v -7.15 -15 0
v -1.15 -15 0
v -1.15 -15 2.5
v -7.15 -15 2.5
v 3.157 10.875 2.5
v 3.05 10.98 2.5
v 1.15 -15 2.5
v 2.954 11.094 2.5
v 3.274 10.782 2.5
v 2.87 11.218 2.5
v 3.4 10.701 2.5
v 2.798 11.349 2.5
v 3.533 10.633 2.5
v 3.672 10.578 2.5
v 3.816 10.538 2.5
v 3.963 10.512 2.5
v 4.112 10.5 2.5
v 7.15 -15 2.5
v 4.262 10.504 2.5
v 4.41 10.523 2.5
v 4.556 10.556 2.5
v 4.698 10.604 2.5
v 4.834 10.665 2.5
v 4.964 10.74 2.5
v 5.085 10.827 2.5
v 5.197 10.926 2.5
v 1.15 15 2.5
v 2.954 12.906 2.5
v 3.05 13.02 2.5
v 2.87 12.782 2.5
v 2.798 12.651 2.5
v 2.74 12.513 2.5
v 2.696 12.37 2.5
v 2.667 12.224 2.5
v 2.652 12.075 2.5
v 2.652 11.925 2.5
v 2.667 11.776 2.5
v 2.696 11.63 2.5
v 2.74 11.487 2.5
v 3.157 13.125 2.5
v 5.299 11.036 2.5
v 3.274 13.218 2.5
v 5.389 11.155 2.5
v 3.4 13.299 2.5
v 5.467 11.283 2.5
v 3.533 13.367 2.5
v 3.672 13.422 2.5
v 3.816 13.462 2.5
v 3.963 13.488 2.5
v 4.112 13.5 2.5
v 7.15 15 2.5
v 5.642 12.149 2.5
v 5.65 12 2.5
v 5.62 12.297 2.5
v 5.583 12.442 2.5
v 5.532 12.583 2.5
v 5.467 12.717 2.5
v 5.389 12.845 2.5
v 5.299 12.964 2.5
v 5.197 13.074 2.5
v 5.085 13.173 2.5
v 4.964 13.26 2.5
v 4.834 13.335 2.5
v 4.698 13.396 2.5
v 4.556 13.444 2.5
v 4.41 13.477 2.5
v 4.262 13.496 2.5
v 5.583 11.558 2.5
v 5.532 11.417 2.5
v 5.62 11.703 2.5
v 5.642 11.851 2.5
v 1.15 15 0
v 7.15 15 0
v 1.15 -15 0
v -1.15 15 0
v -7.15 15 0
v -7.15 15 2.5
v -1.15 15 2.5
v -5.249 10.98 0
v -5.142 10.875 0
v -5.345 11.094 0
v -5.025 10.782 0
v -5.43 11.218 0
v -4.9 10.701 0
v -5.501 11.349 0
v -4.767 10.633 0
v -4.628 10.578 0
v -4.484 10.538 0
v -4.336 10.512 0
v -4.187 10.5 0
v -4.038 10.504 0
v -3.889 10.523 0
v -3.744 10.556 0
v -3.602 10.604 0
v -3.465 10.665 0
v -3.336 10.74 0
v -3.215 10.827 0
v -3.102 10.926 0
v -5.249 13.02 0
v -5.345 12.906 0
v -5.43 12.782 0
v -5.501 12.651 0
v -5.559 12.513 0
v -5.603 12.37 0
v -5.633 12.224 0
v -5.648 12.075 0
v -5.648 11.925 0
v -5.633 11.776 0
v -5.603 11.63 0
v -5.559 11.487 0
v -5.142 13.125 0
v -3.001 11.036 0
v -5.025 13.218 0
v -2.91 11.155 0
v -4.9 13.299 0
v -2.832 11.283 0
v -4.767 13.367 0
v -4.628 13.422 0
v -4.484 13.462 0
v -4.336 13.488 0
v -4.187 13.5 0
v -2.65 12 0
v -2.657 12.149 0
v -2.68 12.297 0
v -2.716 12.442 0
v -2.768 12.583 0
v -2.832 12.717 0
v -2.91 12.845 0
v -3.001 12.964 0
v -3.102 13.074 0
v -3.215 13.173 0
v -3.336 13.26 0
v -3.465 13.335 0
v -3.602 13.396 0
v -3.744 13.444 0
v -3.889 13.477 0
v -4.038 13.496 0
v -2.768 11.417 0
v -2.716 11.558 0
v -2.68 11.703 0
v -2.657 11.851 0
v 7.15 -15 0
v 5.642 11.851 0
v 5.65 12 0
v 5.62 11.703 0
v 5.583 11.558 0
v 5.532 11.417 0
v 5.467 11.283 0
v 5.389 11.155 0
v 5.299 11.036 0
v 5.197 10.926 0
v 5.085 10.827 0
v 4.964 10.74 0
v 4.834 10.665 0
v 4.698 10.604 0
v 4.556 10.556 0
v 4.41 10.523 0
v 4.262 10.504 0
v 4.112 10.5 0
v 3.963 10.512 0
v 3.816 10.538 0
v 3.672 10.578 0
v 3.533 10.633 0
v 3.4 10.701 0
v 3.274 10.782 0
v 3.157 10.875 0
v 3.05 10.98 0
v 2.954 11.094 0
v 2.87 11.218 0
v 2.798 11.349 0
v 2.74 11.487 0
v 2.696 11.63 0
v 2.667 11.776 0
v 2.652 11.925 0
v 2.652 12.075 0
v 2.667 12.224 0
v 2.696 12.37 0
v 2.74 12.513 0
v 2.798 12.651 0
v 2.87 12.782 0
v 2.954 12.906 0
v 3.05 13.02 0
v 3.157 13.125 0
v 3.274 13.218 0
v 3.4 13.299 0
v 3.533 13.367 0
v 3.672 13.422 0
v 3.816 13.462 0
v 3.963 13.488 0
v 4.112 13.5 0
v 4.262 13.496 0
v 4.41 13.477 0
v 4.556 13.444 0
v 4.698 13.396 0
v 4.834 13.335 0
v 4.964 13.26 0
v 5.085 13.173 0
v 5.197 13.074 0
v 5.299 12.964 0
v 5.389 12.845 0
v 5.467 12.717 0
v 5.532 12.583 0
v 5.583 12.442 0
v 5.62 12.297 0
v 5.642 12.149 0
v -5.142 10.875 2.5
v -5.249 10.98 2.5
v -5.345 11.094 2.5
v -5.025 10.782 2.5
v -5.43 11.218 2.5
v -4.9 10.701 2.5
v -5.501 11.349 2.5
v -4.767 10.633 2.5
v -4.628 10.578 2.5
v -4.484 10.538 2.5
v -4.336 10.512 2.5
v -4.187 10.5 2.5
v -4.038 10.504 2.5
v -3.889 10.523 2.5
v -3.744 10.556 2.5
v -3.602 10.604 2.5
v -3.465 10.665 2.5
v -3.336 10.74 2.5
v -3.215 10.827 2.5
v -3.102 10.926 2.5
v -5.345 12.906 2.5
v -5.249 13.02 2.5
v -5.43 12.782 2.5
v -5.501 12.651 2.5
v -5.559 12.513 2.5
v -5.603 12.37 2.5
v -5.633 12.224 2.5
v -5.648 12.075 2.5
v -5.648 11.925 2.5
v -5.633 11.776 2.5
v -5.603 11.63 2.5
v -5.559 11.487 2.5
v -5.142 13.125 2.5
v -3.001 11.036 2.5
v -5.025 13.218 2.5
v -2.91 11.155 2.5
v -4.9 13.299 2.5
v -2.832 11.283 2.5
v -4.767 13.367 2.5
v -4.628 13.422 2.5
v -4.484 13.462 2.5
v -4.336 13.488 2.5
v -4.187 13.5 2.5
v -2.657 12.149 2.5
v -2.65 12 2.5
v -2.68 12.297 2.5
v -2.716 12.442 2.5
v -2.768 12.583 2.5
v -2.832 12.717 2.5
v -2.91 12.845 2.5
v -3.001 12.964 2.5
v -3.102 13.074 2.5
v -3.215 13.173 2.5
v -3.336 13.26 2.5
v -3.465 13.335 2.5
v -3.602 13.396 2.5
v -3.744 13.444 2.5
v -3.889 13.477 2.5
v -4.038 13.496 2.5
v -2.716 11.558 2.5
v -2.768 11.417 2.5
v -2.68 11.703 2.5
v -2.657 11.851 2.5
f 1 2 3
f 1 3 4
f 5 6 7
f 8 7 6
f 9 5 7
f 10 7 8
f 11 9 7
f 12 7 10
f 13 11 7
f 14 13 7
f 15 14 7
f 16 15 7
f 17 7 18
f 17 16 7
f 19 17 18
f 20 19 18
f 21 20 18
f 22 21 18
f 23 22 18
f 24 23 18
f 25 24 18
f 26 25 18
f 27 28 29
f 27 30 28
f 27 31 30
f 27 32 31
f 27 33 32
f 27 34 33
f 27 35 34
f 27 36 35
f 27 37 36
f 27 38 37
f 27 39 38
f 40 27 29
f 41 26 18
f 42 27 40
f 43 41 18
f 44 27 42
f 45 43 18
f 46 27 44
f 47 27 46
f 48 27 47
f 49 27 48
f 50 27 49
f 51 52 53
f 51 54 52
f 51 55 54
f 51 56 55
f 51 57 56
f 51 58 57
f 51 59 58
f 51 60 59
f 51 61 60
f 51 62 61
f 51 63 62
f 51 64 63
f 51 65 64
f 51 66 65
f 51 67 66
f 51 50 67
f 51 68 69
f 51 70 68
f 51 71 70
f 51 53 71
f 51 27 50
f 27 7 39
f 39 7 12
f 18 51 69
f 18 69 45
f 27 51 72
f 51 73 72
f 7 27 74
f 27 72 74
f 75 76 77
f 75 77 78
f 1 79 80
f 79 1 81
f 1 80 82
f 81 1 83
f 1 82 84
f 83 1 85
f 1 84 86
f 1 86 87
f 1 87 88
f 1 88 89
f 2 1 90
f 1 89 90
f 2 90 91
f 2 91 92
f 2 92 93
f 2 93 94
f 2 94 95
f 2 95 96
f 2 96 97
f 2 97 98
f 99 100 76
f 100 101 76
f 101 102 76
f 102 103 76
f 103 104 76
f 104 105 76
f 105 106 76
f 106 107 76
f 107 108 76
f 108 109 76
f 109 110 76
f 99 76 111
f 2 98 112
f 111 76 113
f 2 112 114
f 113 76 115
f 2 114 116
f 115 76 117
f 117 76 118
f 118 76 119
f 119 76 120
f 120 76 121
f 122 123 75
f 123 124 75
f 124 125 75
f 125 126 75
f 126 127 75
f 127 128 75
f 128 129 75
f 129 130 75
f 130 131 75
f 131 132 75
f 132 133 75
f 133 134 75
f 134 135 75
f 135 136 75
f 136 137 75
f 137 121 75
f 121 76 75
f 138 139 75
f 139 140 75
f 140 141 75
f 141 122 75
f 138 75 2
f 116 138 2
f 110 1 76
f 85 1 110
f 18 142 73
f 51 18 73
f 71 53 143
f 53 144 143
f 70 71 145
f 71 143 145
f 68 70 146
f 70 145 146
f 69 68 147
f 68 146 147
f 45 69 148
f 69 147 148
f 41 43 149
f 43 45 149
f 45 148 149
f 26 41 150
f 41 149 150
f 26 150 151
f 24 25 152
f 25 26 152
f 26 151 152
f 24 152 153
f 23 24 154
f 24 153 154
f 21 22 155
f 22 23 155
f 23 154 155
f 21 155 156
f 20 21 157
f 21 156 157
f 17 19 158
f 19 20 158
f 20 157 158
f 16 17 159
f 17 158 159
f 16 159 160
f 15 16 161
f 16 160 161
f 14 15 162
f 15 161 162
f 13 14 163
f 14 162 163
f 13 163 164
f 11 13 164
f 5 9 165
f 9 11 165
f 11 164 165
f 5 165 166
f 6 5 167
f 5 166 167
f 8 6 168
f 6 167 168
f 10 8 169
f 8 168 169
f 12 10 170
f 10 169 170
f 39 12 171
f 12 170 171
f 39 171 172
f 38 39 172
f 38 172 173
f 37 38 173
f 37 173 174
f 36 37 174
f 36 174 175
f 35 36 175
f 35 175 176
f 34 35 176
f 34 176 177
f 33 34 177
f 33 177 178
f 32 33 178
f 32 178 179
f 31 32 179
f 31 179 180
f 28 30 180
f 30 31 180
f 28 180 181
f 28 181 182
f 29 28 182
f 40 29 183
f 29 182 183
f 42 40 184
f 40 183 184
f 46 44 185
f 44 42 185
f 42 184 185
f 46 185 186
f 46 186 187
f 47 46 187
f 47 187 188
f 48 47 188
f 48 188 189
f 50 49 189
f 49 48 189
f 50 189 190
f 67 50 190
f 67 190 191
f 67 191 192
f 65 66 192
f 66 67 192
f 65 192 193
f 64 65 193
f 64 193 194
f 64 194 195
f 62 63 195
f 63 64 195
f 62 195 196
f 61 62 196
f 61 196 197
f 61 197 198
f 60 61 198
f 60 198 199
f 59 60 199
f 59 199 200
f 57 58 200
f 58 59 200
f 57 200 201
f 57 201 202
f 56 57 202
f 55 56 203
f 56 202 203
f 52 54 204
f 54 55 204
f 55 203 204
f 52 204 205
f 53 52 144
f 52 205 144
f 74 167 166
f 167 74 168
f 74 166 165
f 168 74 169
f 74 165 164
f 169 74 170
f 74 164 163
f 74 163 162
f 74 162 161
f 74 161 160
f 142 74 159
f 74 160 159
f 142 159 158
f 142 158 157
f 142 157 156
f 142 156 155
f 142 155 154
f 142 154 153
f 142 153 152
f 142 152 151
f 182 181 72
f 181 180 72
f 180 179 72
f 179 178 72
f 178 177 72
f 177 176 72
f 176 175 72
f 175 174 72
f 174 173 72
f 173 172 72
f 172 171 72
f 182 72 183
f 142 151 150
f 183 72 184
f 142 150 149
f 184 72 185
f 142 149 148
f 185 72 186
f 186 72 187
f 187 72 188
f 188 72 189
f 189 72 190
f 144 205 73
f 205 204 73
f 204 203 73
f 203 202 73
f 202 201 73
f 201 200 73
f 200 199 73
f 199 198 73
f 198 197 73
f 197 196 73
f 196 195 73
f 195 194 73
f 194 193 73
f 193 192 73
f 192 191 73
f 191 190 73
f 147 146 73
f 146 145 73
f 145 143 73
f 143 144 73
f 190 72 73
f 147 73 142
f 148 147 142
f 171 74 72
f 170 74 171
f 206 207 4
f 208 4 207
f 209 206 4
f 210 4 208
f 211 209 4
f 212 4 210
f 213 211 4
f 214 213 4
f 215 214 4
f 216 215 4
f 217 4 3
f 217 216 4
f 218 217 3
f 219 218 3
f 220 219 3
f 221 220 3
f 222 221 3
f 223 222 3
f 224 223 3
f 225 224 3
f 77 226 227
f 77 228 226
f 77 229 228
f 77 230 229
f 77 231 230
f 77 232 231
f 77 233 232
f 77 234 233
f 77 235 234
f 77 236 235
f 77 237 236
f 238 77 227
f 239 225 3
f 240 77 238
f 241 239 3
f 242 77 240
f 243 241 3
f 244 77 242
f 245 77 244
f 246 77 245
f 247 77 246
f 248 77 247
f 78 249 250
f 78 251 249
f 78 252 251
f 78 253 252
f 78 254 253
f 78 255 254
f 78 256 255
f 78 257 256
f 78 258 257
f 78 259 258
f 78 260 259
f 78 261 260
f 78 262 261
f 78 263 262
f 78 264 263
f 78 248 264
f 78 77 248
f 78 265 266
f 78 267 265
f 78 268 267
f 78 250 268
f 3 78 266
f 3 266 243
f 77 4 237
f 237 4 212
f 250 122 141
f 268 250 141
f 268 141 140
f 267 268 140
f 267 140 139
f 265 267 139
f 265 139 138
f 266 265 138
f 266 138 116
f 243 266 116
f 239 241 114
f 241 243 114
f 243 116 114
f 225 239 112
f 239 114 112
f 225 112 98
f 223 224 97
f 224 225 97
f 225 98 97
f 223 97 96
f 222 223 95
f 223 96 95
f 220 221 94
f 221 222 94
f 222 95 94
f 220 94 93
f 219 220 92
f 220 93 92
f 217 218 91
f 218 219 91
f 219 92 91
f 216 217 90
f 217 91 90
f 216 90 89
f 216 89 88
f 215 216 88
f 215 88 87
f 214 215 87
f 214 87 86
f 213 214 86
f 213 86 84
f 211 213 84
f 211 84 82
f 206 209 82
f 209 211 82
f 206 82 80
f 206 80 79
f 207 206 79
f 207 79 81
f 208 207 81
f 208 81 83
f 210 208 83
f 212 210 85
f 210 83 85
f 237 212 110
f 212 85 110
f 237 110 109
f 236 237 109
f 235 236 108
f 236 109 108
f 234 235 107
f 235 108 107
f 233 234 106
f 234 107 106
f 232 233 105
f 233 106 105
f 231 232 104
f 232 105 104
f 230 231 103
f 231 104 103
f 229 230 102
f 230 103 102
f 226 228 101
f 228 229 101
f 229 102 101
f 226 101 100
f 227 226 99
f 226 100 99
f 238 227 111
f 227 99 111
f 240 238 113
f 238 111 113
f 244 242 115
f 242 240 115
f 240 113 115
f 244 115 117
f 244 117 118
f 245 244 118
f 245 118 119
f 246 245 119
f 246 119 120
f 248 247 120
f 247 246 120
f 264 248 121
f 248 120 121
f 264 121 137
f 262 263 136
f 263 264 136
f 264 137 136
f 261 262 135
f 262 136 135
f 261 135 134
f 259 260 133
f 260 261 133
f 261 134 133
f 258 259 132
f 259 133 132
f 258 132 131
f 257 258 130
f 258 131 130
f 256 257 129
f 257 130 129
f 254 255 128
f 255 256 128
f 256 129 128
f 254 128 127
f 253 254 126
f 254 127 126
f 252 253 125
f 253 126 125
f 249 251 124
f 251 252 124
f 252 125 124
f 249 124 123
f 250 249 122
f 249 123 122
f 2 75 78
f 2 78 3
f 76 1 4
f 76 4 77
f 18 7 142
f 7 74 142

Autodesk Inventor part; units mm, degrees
ref_plane "YZ Plane" through (0, 0, 0) normal (1, 0, 0) x (0, 1, 0)
ref_plane "XZ Plane" through (0, 0, 0) normal (0, 1, 0) x (-1, 0, 0)
ref_plane "XY Plane" through (0, 0, 0) normal (0, 0, 1) x (1, 0, 0)
sketch "Sketch1" plane through (0, 0, 0) normal (0, 0, 1) x (1, 0, 0)
  line L0 (-10.0097, 0) -> (10.0097, 0) construction
  line L1 (0, -21) -> (0, 21) construction
  line L2 (-7.1498, 15) -> (-1.1498, 15)
  line L3 (-1.1498, 15) -> (-1.1498, -15)
  line L4 (-1.1498, -15) -> (-7.1498, -15)
  line L5 (-7.1498, -15) -> (-7.1498, 15)
  circle A0 centre (-4.1498, 12) radius 1.5
  line L6 (-4.1498, 15) -> (-4.1498, -15) construction
  line L7 (7.1498, 15) -> (1.1498, 15)
  line L8 (1.1498, 15) -> (1.1498, -15)
  line L9 (1.1498, -15) -> (7.1498, -15)
  line L10 (7.1498, -15) -> (7.1498, 15)
  circle A1 centre (4.1498, 12) radius 1.5
  line L11 (4.1498, 15) -> (4.1498, -15) construction
  point P0 (0, 0)
  dimension "d0" = 6
  dimension "d1" = 3
  dimension "d2" = 3
  dimension "d3" = 30
extrude "Extrusion1" add sketch "Sketch1" along normal blind 2.5
properties part number "LC_sample_holder_clamp"
